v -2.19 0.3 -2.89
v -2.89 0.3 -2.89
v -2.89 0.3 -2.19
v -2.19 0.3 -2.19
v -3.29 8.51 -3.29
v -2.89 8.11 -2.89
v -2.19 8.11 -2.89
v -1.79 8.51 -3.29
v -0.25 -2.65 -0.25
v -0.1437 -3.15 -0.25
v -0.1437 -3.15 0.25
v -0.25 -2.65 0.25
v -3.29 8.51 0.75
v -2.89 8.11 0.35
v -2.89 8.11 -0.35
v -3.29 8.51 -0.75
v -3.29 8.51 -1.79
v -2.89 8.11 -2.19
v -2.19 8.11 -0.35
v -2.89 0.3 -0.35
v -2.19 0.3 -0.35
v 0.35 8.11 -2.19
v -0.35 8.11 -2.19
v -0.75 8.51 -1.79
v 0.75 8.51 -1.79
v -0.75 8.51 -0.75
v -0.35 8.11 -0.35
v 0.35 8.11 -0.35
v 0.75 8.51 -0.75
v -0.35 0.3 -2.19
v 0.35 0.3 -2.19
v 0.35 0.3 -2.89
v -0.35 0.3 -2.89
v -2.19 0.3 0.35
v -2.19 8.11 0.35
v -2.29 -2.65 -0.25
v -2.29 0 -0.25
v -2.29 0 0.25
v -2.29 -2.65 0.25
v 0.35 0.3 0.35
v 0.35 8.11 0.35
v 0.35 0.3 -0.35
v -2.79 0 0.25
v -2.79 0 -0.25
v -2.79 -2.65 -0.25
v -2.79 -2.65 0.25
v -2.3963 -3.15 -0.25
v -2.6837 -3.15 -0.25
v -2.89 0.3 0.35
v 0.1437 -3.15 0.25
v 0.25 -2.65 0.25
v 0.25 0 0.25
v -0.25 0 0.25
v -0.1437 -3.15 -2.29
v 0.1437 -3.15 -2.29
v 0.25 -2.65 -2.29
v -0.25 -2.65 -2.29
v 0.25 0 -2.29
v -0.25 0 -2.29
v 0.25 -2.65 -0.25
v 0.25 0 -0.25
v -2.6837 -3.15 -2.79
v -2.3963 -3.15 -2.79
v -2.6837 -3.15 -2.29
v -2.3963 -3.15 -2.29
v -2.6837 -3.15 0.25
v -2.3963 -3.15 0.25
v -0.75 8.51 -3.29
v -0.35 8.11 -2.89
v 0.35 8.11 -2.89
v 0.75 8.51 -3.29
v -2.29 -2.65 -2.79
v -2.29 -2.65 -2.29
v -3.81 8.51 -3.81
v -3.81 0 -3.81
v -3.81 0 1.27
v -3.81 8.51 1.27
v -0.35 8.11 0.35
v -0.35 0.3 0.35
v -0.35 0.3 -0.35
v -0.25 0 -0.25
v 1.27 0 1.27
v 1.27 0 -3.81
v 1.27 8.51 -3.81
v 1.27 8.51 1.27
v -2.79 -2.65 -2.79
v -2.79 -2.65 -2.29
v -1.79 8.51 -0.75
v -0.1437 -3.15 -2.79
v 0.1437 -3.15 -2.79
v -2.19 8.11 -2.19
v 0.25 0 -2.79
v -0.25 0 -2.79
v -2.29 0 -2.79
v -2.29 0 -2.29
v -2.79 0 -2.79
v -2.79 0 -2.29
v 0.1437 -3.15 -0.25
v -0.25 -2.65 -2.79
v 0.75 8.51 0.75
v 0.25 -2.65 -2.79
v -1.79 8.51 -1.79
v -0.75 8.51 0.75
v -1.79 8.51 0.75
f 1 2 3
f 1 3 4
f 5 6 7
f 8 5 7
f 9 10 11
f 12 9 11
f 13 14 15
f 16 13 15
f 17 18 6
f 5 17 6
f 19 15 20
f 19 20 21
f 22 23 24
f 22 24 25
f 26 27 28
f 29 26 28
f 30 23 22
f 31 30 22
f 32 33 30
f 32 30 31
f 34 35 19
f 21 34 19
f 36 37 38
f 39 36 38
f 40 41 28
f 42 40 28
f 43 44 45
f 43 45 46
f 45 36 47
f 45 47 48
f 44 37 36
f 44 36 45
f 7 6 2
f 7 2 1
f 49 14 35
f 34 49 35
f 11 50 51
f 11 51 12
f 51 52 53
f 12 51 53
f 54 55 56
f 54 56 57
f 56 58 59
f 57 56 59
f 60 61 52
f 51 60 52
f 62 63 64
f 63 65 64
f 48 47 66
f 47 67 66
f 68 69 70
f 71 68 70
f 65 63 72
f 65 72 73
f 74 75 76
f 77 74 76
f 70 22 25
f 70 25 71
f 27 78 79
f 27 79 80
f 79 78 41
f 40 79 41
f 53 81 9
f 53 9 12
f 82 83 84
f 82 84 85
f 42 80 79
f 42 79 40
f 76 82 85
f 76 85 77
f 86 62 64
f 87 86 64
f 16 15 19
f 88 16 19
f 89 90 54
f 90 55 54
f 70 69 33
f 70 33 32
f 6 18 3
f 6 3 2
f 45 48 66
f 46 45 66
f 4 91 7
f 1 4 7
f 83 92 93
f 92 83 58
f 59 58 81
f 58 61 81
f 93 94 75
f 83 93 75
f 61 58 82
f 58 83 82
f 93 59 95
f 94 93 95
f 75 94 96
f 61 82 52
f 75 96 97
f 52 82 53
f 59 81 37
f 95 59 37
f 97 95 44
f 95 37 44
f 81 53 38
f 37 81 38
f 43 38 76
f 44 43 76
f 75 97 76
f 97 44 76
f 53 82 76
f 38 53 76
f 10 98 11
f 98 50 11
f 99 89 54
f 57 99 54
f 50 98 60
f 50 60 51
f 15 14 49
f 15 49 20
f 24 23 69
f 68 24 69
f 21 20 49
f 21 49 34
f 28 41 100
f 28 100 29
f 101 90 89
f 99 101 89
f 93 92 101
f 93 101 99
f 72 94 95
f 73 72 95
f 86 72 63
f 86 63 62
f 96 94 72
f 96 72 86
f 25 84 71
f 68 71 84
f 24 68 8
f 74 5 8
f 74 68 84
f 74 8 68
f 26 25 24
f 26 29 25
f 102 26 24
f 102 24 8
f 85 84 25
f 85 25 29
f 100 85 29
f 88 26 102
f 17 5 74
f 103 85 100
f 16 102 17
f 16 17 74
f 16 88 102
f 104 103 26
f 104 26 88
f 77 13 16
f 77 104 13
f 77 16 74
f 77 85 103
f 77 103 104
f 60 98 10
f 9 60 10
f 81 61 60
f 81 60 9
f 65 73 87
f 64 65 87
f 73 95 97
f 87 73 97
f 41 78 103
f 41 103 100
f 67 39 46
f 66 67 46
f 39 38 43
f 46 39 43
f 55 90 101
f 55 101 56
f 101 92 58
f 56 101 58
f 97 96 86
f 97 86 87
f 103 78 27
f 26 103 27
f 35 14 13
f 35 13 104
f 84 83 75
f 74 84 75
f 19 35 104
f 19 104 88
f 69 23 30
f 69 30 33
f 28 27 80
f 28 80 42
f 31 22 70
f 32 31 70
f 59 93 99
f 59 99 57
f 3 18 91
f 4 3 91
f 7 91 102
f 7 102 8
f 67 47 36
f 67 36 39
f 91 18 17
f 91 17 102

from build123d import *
from OCP.BRepFilletAPI import BRepFilletAPI_MakeChamfer

# Parameters (mm, degrees)
SKETCH_1_W                          = 2.54
SKETCH_1_H                          = 2.54
EXTRUDE_1_DEPTH                     = 8.51
SKETCH_4_W                          = 0.7
SKETCH_4_H                          = 0.7
CUT_EXTRUDE_1_DEPTH                 = 8.21
CHAMFER_3_SIZE                      = 0.4
SKETCH_2_W                          = 0.5
SKETCH_2_H                          = 0.5
EXTRUDE_2_DEPTH                     = 3.15
CHAMFER_2_SIZE                      = 0.5
CHAMFER_2_SIZE2                     = 0.106278281
PATTERN_LINEAR_1_COUNT              = 2
PATTERN_LINEAR_1_PITCH              = 2.54
PATTERN_LINEAR_1_COUNT_DIR2         = 2
PATTERN_LINEAR_1_PITCH_DIR2         = 2.54
CHAMFER_3_OF_PATTERN_LINEAR_1_SIZE  = 0.4
CHAMFER_2_OF_PATTERN_LINEAR_1_SIZE  = 0.5
CHAMFER_2_OF_PATTERN_LINEAR_1_SIZE2 = 0.106278281


with BuildPart() as part:
    # Эскиз1 → Бобышка-Вытянуть1 (new body)
    with BuildSketch(Plane(origin=(0, 0, 0), x_dir=(-1, 0, 0), z_dir=(0, 1, 0))):
        Rectangle(SKETCH_1_W, SKETCH_1_H)
    extrude_1 = extrude(amount=EXTRUDE_1_DEPTH)

    # Эскиз4 → Вырез-Вытянуть1 (cut)
    with BuildSketch(Plane(origin=(0, 8.51, 0), x_dir=(1, 0, 0), z_dir=(0, 1, 0))):
        Rectangle(SKETCH_4_W, SKETCH_4_H)
    cut_extrude_1 = extrude(amount=-CUT_EXTRUDE_1_DEPTH, mode=Mode.SUBTRACT)

    # Фаска3
    chamfer_3_edges = [part.edges().sort_by_distance(p)[0] for p in [
        (-0.35, 8.51, 0),
        (0, 8.51, 0.35),
        (0.35, 8.51, 0),
        (0, 8.51, -0.35),
    ]]
    chamfer(chamfer_3_edges, length=CHAMFER_3_SIZE)

    # Эскиз2 → Бобышка-Вытянуть2 (add)
    with BuildSketch(Plane(origin=(0, 0, 0), x_dir=(-1, 0, 0), z_dir=(0, 1, 0))):
        Rectangle(SKETCH_2_W, SKETCH_2_H)
    extrude_2 = extrude(amount=-EXTRUDE_2_DEPTH)

    # Фаска2: one chamfer whose edges measure the first distance from different faces: ONE call of the kernel's chamfer builder (chamfer() names one face for all edges)
    chamfer_2_edges_1 = [part.edges().sort_by_distance(p)[0] for p in [
        (-0.25, -3.15, 0),
    ]]
    chamfer_2_side_1 = [part.faces().sort_by_distance(p)[0] for p in [
        (-0.25, -1.575, 0),
    ]]
    chamfer_2_edges_2 = [part.edges().sort_by_distance(p)[0] for p in [
        (0.25, -3.15, 0),
    ]]
    chamfer_2_side_2 = [part.faces().sort_by_distance(p)[0] for p in [
        (0.25, -1.575, 0),
    ]]
    chamfer_2 = BRepFilletAPI_MakeChamfer(part.part.solid().wrapped)
    for e in chamfer_2_edges_1:
        chamfer_2.Add(CHAMFER_2_SIZE, CHAMFER_2_SIZE2, e.wrapped, chamfer_2_side_1[0].wrapped)  # the first distance lies on this face
    for e in chamfer_2_edges_2:
        chamfer_2.Add(CHAMFER_2_SIZE, CHAMFER_2_SIZE2, e.wrapped, chamfer_2_side_2[0].wrapped)  # the first distance lies on this face
    add(Compound.cast(chamfer_2.Shape()), mode=Mode.REPLACE)

    # Линейный массив1: Бобышка-Вытянуть1, Вырез-Вытянуть1, Extrude 2 2 × 2
    with Locations(*[(-j * PATTERN_LINEAR_1_PITCH_DIR2, 0, -i * PATTERN_LINEAR_1_PITCH) for i in range(PATTERN_LINEAR_1_COUNT) for j in range(PATTERN_LINEAR_1_COUNT_DIR2) if (i, j) != (0, 0)]):
        add(extrude_1)
        add(cut_extrude_1, mode=Mode.SUBTRACT)
        add(extrude_2)

    # Фаска3 of Линейный массив1
    chamfer_3_of_pattern_linear_1_edges = [part.edges().sort_by_distance(p)[0] for p in [
        (-2.89, 8.51, 0),
        (-2.54, 8.51, 0.35),
        (-2.19, 8.51, 0),
        (-2.54, 8.51, -0.35),
        (-0.35, 8.51, -2.54),
        (0, 8.51, -2.19),
        (0.35, 8.51, -2.54),
        (0, 8.51, -2.89),
        (-2.89, 8.51, -2.54),
        (-2.54, 8.51, -2.19),
        (-2.19, 8.51, -2.54),
        (-2.54, 8.51, -2.89),
    ]]
    chamfer(chamfer_3_of_pattern_linear_1_edges, length=CHAMFER_3_OF_PATTERN_LINEAR_1_SIZE)

    # Фаска2 of Линейный массив1: one chamfer whose edges measure the first distance from different faces: ONE call of the kernel's chamfer builder (chamfer() names one face for all edges)
    chamfer_2_of_pattern_linear_1_edges_1 = [part.edges().sort_by_distance(p)[0] for p in [
        (-2.79, -3.15, 0),
    ]]
    chamfer_2_of_pattern_linear_1_side_1 = [part.faces().sort_by_distance(p)[0] for p in [
        (-2.79, -1.575, 0),
    ]]
    chamfer_2_of_pattern_linear_1_edges_2 = [part.edges().sort_by_distance(p)[0] for p in [
        (-2.29, -3.15, 0),
    ]]
    chamfer_2_of_pattern_linear_1_side_2 = [part.faces().sort_by_distance(p)[0] for p in [
        (-2.29, -1.575, 0),
    ]]
    chamfer_2_of_pattern_linear_1_edges_3 = [part.edges().sort_by_distance(p)[0] for p in [
        (-0.25, -3.15, -2.54),
    ]]
    chamfer_2_of_pattern_linear_1_side_3 = [part.faces().sort_by_distance(p)[0] for p in [
        (-0.25, -1.575, -2.54),
    ]]
    chamfer_2_of_pattern_linear_1_edges_4 = [part.edges().sort_by_distance(p)[0] for p in [
        (0.25, -3.15, -2.54),
    ]]
    chamfer_2_of_pattern_linear_1_side_4 = [part.faces().sort_by_distance(p)[0] for p in [
        (0.25, -1.575, -2.54),
    ]]
    chamfer_2_of_pattern_linear_1_edges_5 = [part.edges().sort_by_distance(p)[0] for p in [
        (-2.79, -3.15, -2.54),
    ]]
    chamfer_2_of_pattern_linear_1_side_5 = [part.faces().sort_by_distance(p)[0] for p in [
        (-2.79, -1.575, -2.54),
    ]]
    chamfer_2_of_pattern_linear_1_edges_6 = [part.edges().sort_by_distance(p)[0] for p in [
        (-2.29, -3.15, -2.54),
    ]]
    chamfer_2_of_pattern_linear_1_side_6 = [part.faces().sort_by_distance(p)[0] for p in [
        (-2.29, -1.575, -2.54),
    ]]
    chamfer_2_of_pattern_linear_1 = BRepFilletAPI_MakeChamfer(part.part.solid().wrapped)
    for e in chamfer_2_of_pattern_linear_1_edges_1:
        chamfer_2_of_pattern_linear_1.Add(CHAMFER_2_OF_PATTERN_LINEAR_1_SIZE, CHAMFER_2_OF_PATTERN_LINEAR_1_SIZE2, e.wrapped, chamfer_2_of_pattern_linear_1_side_1[0].wrapped)  # the first distance lies on this face
    for e in chamfer_2_of_pattern_linear_1_edges_2:
        chamfer_2_of_pattern_linear_1.Add(CHAMFER_2_OF_PATTERN_LINEAR_1_SIZE, CHAMFER_2_OF_PATTERN_LINEAR_1_SIZE2, e.wrapped, chamfer_2_of_pattern_linear_1_side_2[0].wrapped)  # the first distance lies on this face
    for e in chamfer_2_of_pattern_linear_1_edges_3:
        chamfer_2_of_pattern_linear_1.Add(CHAMFER_2_OF_PATTERN_LINEAR_1_SIZE, CHAMFER_2_OF_PATTERN_LINEAR_1_SIZE2, e.wrapped, chamfer_2_of_pattern_linear_1_side_3[0].wrapped)  # the first distance lies on this face
    for e in chamfer_2_of_pattern_linear_1_edges_4:
        chamfer_2_of_pattern_linear_1.Add(CHAMFER_2_OF_PATTERN_LINEAR_1_SIZE, CHAMFER_2_OF_PATTERN_LINEAR_1_SIZE2, e.wrapped, chamfer_2_of_pattern_linear_1_side_4[0].wrapped)  # the first distance lies on this face
    for e in chamfer_2_of_pattern_linear_1_edges_5:
        chamfer_2_of_pattern_linear_1.Add(CHAMFER_2_OF_PATTERN_LINEAR_1_SIZE, CHAMFER_2_OF_PATTERN_LINEAR_1_SIZE2, e.wrapped, chamfer_2_of_pattern_linear_1_side_5[0].wrapped)  # the first distance lies on this face
    for e in chamfer_2_of_pattern_linear_1_edges_6:
        chamfer_2_of_pattern_linear_1.Add(CHAMFER_2_OF_PATTERN_LINEAR_1_SIZE, CHAMFER_2_OF_PATTERN_LINEAR_1_SIZE2, e.wrapped, chamfer_2_of_pattern_linear_1_side_6[0].wrapped)  # the first distance lies on this face
    add(Compound.cast(chamfer_2_of_pattern_linear_1.Shape()), mode=Mode.REPLACE)


solid = part.part
